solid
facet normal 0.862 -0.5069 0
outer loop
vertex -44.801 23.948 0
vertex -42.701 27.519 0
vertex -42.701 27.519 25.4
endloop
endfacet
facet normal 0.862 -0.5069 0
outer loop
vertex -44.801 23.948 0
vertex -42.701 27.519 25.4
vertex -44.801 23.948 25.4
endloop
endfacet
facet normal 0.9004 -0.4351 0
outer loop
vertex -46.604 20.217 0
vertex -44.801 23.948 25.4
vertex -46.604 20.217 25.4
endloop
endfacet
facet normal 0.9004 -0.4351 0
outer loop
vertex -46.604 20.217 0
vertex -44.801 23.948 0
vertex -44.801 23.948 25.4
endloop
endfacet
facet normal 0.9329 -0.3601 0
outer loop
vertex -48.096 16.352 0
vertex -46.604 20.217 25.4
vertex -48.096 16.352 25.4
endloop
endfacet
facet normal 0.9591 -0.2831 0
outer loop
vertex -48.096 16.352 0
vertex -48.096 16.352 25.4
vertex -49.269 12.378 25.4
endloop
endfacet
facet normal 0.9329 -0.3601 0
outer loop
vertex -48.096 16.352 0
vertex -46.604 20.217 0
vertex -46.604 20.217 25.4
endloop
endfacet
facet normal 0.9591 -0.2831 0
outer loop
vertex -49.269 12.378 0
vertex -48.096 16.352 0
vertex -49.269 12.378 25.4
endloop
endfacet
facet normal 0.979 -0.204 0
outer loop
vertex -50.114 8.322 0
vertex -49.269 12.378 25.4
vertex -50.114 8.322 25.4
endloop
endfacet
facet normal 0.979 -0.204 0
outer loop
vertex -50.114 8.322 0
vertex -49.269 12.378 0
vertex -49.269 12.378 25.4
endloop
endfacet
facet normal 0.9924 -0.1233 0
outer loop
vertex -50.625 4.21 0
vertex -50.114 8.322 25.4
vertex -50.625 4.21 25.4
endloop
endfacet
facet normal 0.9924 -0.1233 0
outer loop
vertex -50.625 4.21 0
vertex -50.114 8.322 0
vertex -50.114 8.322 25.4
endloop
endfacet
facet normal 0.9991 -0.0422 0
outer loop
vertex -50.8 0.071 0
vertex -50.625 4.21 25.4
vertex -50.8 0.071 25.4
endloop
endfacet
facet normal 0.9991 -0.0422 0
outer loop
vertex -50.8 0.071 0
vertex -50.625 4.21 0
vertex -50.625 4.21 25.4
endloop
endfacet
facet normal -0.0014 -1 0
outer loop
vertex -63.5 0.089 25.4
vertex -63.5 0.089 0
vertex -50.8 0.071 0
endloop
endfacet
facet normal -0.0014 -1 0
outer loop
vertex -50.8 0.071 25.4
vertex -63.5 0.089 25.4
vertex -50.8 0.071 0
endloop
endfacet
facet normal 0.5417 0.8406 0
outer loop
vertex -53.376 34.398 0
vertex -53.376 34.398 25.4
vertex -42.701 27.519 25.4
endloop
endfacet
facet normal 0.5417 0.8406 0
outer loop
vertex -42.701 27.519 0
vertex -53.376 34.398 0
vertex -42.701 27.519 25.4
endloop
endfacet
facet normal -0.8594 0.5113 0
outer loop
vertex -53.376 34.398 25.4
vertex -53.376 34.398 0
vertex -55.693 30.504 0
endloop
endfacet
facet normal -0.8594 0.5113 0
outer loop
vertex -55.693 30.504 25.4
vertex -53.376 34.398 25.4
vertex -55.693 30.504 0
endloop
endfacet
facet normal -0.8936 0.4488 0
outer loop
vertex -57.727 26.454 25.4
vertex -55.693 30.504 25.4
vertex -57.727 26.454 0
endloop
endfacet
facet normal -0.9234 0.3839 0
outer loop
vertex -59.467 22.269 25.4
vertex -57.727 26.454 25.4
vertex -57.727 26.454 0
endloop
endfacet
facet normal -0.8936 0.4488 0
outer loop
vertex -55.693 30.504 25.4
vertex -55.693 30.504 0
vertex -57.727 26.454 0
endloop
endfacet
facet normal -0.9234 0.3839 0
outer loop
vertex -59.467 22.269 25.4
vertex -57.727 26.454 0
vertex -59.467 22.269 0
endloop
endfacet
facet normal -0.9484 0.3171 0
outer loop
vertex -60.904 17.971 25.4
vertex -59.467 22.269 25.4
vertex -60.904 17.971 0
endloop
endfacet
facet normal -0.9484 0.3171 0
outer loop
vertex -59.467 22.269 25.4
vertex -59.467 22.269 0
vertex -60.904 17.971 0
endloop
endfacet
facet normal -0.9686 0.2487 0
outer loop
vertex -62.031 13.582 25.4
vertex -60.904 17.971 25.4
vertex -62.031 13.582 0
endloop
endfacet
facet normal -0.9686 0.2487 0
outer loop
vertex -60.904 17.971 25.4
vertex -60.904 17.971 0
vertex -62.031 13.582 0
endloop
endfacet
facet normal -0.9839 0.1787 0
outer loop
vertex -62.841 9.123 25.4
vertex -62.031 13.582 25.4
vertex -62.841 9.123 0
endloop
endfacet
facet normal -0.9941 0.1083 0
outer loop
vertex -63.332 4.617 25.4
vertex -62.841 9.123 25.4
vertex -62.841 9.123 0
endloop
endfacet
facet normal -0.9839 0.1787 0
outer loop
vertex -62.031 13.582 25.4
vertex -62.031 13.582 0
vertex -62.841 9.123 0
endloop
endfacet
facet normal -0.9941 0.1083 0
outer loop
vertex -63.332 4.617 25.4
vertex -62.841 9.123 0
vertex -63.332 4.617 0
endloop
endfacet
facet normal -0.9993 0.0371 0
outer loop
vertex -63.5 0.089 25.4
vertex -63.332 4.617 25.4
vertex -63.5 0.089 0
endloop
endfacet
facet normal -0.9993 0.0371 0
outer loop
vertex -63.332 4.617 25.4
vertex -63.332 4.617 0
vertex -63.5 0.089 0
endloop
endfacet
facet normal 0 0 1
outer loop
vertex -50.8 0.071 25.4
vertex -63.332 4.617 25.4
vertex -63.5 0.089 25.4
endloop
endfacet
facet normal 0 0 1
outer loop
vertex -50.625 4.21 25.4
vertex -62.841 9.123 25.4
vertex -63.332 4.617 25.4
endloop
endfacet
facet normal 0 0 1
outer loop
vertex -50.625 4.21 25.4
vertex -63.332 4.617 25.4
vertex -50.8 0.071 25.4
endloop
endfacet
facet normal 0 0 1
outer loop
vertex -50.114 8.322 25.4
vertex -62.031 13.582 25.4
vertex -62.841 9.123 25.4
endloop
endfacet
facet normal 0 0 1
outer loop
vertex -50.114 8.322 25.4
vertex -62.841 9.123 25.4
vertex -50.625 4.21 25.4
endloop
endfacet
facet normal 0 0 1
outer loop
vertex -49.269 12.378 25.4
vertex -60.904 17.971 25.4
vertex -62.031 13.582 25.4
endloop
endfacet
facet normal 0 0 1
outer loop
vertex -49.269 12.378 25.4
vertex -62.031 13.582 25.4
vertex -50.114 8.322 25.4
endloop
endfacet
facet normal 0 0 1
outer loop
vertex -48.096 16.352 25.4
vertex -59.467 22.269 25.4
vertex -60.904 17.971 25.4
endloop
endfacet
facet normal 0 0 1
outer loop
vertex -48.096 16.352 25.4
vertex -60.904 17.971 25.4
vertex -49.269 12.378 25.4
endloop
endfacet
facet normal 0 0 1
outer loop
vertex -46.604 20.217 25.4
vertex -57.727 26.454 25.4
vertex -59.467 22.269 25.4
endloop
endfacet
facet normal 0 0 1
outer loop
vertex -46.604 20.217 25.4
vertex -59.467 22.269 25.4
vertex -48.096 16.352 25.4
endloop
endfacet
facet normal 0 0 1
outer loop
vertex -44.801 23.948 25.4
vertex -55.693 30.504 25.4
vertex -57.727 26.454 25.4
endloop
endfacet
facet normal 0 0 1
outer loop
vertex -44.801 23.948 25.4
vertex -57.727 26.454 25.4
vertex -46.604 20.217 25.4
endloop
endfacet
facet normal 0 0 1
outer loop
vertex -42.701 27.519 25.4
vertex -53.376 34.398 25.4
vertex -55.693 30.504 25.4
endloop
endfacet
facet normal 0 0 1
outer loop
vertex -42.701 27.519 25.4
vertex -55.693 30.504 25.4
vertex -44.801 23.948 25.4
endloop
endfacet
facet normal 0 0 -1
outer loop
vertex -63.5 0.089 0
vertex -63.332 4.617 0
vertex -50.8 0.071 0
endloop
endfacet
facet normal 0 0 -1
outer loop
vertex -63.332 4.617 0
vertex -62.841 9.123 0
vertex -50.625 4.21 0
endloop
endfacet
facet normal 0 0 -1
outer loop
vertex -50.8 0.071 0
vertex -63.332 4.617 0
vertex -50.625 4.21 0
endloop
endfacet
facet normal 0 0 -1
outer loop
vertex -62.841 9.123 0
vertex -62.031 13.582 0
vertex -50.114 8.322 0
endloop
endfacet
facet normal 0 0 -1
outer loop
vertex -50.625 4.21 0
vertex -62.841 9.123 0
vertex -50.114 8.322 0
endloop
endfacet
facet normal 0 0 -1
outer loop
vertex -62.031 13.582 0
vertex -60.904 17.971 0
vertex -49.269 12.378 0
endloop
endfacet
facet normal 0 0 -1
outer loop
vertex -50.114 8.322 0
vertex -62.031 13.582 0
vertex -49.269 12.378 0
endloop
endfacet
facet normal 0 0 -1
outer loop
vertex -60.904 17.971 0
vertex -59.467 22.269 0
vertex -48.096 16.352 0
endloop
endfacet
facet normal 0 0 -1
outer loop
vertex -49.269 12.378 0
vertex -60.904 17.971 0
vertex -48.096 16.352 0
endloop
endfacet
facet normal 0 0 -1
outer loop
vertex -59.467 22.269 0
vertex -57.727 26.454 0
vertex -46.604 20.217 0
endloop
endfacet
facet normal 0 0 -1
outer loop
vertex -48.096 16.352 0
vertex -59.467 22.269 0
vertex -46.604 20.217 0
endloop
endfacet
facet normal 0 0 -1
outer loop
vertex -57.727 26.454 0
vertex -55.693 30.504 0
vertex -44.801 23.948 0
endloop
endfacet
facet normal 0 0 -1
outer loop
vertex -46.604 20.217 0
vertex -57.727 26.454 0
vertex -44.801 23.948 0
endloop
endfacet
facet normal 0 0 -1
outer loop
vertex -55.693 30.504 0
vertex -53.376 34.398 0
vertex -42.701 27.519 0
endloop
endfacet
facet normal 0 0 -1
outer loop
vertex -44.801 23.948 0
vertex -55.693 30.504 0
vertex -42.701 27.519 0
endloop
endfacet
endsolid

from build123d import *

# Parameters (mm, degrees)
SKETCH1_R           = 63.5
SKETCH1_R_2         = 50.8
BOSS_EXTRUDE1_DEPTH = 25.4
SKETCH2_W           = 45.380209112
SKETCH2_H           = 34.63225072
CUT_REVOLVE1_ANGLE  = 0.08
SKETCH2_2_W         = 45.380209112
SKETCH2_2_H         = 34.63225072
CUT_REVOLVE2_ANGLE  = 327.2


with BuildPart() as part:
    # Sketch1 → Boss-Extrude1 (new body)
    with BuildSketch(Plane.XY):
        Circle(SKETCH1_R)
        Circle(SKETCH1_R_2, mode=Mode.SUBTRACT)
    extrude(amount=BOSS_EXTRUDE1_DEPTH)

    # Sketch2 → Cut-Revolve1 (revolve, cut)
    with BuildSketch(Plane(origin=(0, 0, 0), x_dir=(1, 0, 0), z_dir=(0, 1, 0))):
        with Locations((-63.5, -12.7)):
            Rectangle(SKETCH2_W, SKETCH2_H)
    revolve(axis=Axis((0, 0, 25.4), (0, 0, -1)), revolution_arc=CUT_REVOLVE1_ANGLE, mode=Mode.SUBTRACT)

    # Sketch2<2> → Cut-Revolve2 (revolve, cut)
    with BuildSketch(Plane(origin=(0, 0, 0), x_dir=(1, 0, 0), z_dir=(0, 1, 0))):
        with Locations((-63.5, -12.7)):
            Rectangle(SKETCH2_2_W, SKETCH2_2_H)
    revolve(axis=Axis((0, 0, 25.4), (0, 0, 1)), revolution_arc=CUT_REVOLVE2_ANGLE, mode=Mode.SUBTRACT)


solid = part.part
